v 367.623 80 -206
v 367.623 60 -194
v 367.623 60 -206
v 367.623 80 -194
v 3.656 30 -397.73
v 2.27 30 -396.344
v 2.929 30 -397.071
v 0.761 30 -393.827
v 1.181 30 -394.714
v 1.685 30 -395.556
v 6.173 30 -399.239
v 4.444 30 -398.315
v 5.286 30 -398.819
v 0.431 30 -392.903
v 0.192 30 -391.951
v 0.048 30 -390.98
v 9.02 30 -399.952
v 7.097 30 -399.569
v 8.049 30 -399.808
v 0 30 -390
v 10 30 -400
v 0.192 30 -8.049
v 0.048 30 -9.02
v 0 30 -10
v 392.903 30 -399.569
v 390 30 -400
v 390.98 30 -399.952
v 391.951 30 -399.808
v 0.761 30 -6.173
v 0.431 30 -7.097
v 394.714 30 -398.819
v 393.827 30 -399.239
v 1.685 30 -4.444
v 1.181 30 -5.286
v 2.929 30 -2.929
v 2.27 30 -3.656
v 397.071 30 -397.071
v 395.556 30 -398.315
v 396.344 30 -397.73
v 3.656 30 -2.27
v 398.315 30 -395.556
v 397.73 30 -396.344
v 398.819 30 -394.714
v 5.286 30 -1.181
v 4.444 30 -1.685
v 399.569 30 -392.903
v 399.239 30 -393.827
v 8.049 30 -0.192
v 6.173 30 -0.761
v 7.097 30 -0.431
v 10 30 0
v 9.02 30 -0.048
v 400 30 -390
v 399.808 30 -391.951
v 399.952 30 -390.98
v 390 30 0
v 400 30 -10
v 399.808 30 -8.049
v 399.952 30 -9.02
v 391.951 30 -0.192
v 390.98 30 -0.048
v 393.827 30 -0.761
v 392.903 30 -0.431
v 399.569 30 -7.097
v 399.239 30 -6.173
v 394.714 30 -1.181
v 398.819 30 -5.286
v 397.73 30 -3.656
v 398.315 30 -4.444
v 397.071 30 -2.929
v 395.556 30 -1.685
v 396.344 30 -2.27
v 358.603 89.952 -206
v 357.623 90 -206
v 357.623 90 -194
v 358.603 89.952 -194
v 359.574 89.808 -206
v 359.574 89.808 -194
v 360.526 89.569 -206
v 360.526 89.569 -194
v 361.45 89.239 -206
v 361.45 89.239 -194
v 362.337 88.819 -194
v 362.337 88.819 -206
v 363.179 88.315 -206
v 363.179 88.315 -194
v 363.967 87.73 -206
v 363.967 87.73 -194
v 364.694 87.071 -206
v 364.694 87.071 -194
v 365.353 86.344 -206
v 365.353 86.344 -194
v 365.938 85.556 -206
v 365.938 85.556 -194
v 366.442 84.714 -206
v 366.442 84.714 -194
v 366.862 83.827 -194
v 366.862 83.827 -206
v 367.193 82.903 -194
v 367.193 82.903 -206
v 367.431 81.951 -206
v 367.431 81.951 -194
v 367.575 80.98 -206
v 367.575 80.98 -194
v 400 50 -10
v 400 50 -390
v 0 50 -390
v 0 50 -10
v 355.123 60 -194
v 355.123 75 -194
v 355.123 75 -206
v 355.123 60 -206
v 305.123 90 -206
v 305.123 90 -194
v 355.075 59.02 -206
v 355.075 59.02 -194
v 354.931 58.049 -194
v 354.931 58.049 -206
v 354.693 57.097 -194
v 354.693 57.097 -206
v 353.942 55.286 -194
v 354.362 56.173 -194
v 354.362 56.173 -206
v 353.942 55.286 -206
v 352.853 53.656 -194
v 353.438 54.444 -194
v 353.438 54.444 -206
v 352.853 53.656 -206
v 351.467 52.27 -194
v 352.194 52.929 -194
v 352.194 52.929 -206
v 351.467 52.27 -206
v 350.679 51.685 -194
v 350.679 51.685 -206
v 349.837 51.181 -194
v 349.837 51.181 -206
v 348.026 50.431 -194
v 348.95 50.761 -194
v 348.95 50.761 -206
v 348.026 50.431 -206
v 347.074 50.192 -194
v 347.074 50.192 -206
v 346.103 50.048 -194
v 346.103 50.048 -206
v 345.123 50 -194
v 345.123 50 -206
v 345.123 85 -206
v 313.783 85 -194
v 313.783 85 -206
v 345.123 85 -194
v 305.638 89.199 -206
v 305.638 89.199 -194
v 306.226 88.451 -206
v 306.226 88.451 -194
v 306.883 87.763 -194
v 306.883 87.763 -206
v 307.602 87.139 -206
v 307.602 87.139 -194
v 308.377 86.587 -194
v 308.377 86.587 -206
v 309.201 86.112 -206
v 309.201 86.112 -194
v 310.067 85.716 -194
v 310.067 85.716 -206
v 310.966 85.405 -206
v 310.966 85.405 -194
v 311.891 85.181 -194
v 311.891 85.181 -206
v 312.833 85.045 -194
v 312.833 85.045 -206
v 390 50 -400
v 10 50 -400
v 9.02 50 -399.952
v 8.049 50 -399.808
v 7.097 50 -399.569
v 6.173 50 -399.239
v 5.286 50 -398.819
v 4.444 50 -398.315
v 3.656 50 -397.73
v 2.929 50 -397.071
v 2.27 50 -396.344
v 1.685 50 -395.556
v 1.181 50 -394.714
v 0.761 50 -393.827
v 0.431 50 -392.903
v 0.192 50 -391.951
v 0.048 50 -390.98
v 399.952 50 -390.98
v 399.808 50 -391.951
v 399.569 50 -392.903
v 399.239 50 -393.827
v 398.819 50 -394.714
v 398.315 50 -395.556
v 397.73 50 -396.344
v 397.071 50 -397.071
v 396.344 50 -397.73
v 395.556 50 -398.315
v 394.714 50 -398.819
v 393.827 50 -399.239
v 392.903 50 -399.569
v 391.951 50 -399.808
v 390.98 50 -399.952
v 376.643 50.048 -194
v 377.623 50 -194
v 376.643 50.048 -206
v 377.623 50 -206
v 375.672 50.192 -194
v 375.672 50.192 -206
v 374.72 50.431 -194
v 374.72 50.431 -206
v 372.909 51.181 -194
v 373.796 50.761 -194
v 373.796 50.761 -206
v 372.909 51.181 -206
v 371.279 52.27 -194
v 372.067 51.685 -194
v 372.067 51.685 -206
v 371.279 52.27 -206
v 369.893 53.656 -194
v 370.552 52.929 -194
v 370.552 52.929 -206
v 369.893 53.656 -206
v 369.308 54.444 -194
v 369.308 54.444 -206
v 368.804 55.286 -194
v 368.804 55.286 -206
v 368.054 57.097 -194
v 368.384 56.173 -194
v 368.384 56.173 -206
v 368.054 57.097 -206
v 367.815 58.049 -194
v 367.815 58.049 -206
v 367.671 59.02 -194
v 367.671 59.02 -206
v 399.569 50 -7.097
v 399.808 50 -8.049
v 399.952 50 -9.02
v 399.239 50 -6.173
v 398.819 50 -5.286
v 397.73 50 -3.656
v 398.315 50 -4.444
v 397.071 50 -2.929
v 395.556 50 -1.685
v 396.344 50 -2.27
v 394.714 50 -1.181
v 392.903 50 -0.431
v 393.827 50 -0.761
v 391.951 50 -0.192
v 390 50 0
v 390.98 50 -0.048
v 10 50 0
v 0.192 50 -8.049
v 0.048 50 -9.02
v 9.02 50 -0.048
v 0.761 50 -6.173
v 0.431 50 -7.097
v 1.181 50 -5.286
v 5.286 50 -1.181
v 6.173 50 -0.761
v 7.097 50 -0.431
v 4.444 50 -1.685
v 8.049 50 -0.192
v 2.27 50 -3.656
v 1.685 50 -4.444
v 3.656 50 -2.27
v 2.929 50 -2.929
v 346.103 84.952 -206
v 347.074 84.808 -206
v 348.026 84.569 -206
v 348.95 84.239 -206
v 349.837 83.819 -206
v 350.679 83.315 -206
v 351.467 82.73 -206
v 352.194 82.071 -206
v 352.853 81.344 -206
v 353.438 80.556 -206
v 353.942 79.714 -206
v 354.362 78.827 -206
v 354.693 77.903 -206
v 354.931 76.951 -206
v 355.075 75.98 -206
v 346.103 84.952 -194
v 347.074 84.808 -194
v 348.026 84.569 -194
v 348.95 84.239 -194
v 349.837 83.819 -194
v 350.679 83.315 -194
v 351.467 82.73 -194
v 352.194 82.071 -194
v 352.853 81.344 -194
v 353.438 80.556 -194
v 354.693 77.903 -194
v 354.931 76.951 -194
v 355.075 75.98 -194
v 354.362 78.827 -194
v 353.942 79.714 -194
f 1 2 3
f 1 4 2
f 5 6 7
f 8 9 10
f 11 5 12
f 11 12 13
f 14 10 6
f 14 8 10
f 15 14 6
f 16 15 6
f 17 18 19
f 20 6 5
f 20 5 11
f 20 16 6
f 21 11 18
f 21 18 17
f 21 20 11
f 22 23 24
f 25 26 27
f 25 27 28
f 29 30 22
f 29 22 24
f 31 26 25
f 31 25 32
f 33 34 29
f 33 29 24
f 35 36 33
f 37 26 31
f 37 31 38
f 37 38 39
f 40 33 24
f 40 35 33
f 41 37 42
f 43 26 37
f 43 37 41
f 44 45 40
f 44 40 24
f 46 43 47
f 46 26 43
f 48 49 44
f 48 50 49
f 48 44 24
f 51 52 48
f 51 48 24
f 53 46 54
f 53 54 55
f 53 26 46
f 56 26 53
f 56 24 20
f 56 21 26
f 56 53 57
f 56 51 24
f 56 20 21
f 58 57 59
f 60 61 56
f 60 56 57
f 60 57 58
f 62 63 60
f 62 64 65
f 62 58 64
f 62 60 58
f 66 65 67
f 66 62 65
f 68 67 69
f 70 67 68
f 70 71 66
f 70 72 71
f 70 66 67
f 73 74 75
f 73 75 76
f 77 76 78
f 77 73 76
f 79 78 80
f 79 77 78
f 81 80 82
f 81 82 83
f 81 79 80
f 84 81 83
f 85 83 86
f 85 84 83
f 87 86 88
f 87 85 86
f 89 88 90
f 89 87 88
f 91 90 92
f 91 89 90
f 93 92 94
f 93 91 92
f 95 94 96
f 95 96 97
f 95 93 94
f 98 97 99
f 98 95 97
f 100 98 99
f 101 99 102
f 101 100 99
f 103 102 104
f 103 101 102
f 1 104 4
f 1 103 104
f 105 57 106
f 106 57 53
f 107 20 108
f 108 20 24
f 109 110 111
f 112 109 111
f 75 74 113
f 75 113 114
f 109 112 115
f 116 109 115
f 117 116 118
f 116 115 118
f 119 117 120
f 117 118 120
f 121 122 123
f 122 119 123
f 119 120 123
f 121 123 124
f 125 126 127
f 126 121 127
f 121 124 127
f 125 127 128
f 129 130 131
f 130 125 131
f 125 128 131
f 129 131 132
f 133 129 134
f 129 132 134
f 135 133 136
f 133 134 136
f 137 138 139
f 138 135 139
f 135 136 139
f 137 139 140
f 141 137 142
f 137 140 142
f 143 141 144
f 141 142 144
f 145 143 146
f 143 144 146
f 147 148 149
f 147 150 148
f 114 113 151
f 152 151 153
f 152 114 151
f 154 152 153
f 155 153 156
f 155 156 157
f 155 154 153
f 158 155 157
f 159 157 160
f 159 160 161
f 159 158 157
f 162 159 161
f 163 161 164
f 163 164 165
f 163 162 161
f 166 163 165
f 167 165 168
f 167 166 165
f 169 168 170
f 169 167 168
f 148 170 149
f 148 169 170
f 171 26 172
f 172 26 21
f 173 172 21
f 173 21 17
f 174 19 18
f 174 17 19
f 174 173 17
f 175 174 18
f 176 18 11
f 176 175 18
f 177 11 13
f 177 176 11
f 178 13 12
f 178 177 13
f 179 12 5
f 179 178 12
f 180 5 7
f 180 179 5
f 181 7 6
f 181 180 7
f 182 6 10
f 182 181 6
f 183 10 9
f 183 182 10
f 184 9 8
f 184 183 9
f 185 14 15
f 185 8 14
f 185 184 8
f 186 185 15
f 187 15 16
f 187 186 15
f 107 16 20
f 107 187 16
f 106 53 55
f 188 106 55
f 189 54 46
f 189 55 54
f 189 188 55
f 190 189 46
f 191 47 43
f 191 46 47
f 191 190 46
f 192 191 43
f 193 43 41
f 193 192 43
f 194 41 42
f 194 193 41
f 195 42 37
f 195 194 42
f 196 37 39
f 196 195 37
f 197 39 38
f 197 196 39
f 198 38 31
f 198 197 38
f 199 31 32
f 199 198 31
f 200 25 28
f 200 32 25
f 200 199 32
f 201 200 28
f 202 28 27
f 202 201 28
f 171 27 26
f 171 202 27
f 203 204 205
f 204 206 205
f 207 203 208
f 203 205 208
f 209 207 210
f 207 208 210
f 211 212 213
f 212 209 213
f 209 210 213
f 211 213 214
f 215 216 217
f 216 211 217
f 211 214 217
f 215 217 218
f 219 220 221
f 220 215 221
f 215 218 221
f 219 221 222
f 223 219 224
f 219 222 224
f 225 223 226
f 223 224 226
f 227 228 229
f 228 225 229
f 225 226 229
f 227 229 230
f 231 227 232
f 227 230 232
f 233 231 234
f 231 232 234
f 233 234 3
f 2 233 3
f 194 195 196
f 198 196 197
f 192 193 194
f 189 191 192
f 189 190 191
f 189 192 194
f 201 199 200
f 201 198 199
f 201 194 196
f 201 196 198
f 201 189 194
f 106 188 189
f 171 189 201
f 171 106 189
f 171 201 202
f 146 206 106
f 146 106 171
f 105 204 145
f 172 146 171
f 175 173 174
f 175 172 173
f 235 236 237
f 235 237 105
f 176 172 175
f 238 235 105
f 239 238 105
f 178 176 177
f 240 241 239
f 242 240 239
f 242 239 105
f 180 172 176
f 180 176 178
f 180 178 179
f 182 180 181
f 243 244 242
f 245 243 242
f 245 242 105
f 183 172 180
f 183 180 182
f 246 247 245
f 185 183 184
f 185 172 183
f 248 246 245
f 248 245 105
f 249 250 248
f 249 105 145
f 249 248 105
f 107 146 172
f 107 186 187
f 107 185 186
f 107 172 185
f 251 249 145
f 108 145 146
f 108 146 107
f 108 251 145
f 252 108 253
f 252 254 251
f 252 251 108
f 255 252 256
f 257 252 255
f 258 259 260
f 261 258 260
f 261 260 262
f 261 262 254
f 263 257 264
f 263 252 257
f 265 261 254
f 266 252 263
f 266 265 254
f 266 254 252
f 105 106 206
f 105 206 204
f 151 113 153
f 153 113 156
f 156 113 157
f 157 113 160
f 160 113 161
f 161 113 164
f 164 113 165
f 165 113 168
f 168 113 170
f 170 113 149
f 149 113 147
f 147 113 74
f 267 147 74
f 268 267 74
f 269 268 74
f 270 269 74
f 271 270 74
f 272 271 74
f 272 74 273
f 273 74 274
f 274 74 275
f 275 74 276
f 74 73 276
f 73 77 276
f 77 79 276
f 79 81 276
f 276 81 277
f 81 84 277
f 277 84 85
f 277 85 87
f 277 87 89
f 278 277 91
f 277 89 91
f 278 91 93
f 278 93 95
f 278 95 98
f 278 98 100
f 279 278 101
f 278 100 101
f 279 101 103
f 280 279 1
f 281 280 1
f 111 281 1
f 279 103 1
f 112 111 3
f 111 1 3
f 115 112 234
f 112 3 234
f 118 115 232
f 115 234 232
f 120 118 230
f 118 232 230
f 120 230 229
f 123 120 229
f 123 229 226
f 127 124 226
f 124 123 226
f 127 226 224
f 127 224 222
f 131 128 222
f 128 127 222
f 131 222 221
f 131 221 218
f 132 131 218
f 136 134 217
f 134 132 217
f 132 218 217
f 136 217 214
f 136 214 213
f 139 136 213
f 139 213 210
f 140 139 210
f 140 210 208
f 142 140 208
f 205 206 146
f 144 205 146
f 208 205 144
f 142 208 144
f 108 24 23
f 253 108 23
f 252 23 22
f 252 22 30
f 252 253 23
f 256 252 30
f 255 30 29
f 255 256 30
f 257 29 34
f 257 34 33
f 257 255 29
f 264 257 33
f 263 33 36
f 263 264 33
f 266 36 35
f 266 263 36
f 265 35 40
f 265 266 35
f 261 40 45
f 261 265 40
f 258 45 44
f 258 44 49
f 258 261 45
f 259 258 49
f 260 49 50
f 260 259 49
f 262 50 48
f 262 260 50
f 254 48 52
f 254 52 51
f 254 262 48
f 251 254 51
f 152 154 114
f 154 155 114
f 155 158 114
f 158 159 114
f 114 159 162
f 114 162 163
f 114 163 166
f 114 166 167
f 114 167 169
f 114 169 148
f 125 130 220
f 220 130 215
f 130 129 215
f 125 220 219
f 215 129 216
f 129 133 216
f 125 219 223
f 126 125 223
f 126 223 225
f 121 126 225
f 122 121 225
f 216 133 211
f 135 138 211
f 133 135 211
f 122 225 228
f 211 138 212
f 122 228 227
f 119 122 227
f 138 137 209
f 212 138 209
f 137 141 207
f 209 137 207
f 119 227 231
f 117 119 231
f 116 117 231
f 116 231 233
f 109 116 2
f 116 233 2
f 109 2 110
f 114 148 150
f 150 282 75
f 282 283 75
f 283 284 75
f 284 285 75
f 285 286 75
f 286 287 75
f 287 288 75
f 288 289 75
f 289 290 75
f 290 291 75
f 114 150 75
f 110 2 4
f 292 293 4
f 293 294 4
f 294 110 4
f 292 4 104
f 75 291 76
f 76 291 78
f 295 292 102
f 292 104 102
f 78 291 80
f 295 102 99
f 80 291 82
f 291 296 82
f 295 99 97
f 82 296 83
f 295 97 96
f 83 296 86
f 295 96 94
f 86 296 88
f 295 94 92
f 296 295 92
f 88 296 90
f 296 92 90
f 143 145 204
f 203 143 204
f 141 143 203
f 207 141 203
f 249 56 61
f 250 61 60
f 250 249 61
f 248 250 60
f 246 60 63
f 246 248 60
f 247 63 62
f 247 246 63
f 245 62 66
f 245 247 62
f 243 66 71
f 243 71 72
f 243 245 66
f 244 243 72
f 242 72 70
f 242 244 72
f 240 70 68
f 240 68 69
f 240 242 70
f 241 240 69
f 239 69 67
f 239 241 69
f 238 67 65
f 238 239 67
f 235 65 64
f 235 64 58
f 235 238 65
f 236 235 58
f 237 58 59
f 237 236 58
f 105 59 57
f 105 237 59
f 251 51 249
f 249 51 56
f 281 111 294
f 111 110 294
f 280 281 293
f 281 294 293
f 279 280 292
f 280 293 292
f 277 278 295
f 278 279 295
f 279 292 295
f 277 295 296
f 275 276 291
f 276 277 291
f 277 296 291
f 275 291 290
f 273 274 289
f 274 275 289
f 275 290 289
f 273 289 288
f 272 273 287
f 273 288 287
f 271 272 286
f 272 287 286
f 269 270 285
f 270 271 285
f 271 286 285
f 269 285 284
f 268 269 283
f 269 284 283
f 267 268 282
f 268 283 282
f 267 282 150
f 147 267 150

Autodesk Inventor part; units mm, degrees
ref_plane "YZ Plane" through (0, 0, 0) normal (1, 0, 0) x (0, 1, 0)
ref_plane "XZ Plane" through (0, 0, 0) normal (0, 1, 0) x (-1, 0, 0)
ref_plane "XY Plane" through (0, 0, 0) normal (0, 0, 1) x (1, 0, 0)
sketch "Sketch1" plane through (0, 0, 0) normal (0, 1, 0) x (-1, 0, 0)
  point P0 (0, 0)
sketch "Sketch2" plane through (0, 0, 0) normal (0, 1, 0) x (-1, 0, 0)
  line L0 (0, 0) -> (-400, 0)
  line L1 (-400, 0) -> (-400, -400)
  line L2 (-400, -400) -> (0, -400)
  line L3 (0, -400) -> (0, 0)
  dimension "d0" = 400
  dimension "d1" = 400
extrude "Extrusion1" add sketch "Sketch2" along normal blind 50
sketch "Sketch3" plane through (0, 50, 0) normal (0, 1, 0) x (1, 0, 0)
  line L0 (0, 400) -> (0, 0) projected
  line L1 (0, 200) -> (400, 200)
  line L2 (400, 0) -> (400, 400) projected
  line L3 (330.1231, 200) -> (330.1231, 206)
  line L4 (330.1231, 200) -> (330.1231, 194)
  line L5 (330.1231, 194) -> (325.1231, 194)
  line L6 (325.1231, 194) -> (325.1231, 206)
  line L7 (325.1231, 206) -> (330.1231, 206)
  dimension "d4" = 6
  dimension "d5" = 6
  dimension "d6" = 5
extrude "Extrusion2" add sketch "Sketch3" along normal blind 40
sketch "Sketch4" plane through (0, 0, 0) normal (0, -1, 0) x (1, 0, 0)
  line L0 (400, -400) -> (0, -400) projected
  line L1 (400, 0) -> (400, -400) projected
  line L2 (0, -400) -> (400, -400)
  line L3 (400, -400) -> (400, 0)
  line L4 (400, 0) -> (0, 0)
  line L5 (0, 0) -> (0, -400)
extrude "Extrusion3" cut sketch "Sketch4" against normal blind 30
fillet "Fillet1" radius 10 4 edges at (0, 40, 0) (0, 40, -400) (400, 40, -400) (400, 40, 0)
sketch "Sketch5" plane through (330.1231, 50, -194) normal (1, 0, 0) x (0, 0, -1)
  line L0 (0, 0) -> (0, 40) projected
  line L1 (0, 0) -> (12, 0) projected
  line L2 (0, 40) -> (12, 40)
  line L3 (12, 40) -> (12, 0)
  line L4 (12, 0) -> (0, 0)
  line L5 (0, 0) -> (0, 40)
  point P0 (-194, -50)
extrude "Extrusion4" add sketch "Sketch5" along normal blind 60
sketch "Sketch7" plane through (325.1231, 50, -206) normal (-1, 0, 0) x (0, 0, 1)
  line L0 (0, 40) -> (12, 40) projected
  line L1 (12, 0) -> (0, 0) projected
  line L2 (0, 40) -> (12, 40)
  line L3 (12, 40) -> (12, 0)
  line L4 (12, 0) -> (0, 0)
  line L5 (0, 0) -> (0, 40)
  point P0 (206, -50)
extrude "Extrusion6" cut sketch "Sketch7" against normal blind 45
sketch "Sketch8" plane through (390.1231, 50, -194) normal (1, 0, 0) x (0, 0, -1)
  line L0 (12, 40) -> (0, 40) projected
  line L1 (12, 0) -> (0, 0) projected
  line L2 (0, 40) -> (12, 40)
  line L3 (12, 40) -> (12, 0)
  line L4 (12, 0) -> (0, 0)
  line L5 (0, 0) -> (0, 40)
  point P0 (-194, -50)
extrude "Extrusion7" add sketch "Sketch8" against normal blind 35
sketch "Sketch9" plane through (390.1231, 50, -194) normal (1, 0, 0) x (0, 0, -1)
  line L0 (12, 40) -> (0, 40) projected
  line L1 (12, 0) -> (12, 40) projected
  line L2 (0, 40) -> (12, 40)
  line L3 (12, 40) -> (12, 0)
  line L4 (12, 0) -> (0, 0)
  line L5 (0, 0) -> (0, 40)
  point P0 (-194, -50)
extrude "Extrusion8" cut sketch "Sketch9" against normal blind 22.5
sketch "Sketch10" plane through (355.1231, 50, -194) normal (-1, 0, 0) x (0, 0, 1)
  line L0 (-12, 40) -> (-12, 0) projected
  line L1 (0, 0) -> (0, 40) projected
  line L2 (-12, 40) -> (0, 40)
  line L3 (0, 40) -> (0, 35)
  line L4 (0, 35) -> (-12, 35)
  line L5 (-12, 35) -> (-12, 40)
  point P0 (194, -50)
  dimension "d22" = 5
extrude "Extrusion9" add sketch "Sketch10" along normal blind 50
fillet "Fillet2" radius 10 5 edges at (367.6231, 90, -200) (355.1231, 85, -200) (305.1231, 85, -200) (355.1231, 50, -200) (367.6231, 50, -200)
sketch "Sketch6" plane through (325.1231, 50, -206) normal (-1, 0, 0) x (0, 0, 1)
  line L0 (0, 0) -> (0, 40) projected
  line L1 (12, 40) -> (12, 0) projected
  line L2 (0, 40) -> (12, 40)
  line L3 (12, 40) -> (12, 0)
  line L4 (12, 0) -> (0, 0)
  line L5 (0, 0) -> (0, 40)
  point P0 (206, -50)
properties part number "wood part 2"
